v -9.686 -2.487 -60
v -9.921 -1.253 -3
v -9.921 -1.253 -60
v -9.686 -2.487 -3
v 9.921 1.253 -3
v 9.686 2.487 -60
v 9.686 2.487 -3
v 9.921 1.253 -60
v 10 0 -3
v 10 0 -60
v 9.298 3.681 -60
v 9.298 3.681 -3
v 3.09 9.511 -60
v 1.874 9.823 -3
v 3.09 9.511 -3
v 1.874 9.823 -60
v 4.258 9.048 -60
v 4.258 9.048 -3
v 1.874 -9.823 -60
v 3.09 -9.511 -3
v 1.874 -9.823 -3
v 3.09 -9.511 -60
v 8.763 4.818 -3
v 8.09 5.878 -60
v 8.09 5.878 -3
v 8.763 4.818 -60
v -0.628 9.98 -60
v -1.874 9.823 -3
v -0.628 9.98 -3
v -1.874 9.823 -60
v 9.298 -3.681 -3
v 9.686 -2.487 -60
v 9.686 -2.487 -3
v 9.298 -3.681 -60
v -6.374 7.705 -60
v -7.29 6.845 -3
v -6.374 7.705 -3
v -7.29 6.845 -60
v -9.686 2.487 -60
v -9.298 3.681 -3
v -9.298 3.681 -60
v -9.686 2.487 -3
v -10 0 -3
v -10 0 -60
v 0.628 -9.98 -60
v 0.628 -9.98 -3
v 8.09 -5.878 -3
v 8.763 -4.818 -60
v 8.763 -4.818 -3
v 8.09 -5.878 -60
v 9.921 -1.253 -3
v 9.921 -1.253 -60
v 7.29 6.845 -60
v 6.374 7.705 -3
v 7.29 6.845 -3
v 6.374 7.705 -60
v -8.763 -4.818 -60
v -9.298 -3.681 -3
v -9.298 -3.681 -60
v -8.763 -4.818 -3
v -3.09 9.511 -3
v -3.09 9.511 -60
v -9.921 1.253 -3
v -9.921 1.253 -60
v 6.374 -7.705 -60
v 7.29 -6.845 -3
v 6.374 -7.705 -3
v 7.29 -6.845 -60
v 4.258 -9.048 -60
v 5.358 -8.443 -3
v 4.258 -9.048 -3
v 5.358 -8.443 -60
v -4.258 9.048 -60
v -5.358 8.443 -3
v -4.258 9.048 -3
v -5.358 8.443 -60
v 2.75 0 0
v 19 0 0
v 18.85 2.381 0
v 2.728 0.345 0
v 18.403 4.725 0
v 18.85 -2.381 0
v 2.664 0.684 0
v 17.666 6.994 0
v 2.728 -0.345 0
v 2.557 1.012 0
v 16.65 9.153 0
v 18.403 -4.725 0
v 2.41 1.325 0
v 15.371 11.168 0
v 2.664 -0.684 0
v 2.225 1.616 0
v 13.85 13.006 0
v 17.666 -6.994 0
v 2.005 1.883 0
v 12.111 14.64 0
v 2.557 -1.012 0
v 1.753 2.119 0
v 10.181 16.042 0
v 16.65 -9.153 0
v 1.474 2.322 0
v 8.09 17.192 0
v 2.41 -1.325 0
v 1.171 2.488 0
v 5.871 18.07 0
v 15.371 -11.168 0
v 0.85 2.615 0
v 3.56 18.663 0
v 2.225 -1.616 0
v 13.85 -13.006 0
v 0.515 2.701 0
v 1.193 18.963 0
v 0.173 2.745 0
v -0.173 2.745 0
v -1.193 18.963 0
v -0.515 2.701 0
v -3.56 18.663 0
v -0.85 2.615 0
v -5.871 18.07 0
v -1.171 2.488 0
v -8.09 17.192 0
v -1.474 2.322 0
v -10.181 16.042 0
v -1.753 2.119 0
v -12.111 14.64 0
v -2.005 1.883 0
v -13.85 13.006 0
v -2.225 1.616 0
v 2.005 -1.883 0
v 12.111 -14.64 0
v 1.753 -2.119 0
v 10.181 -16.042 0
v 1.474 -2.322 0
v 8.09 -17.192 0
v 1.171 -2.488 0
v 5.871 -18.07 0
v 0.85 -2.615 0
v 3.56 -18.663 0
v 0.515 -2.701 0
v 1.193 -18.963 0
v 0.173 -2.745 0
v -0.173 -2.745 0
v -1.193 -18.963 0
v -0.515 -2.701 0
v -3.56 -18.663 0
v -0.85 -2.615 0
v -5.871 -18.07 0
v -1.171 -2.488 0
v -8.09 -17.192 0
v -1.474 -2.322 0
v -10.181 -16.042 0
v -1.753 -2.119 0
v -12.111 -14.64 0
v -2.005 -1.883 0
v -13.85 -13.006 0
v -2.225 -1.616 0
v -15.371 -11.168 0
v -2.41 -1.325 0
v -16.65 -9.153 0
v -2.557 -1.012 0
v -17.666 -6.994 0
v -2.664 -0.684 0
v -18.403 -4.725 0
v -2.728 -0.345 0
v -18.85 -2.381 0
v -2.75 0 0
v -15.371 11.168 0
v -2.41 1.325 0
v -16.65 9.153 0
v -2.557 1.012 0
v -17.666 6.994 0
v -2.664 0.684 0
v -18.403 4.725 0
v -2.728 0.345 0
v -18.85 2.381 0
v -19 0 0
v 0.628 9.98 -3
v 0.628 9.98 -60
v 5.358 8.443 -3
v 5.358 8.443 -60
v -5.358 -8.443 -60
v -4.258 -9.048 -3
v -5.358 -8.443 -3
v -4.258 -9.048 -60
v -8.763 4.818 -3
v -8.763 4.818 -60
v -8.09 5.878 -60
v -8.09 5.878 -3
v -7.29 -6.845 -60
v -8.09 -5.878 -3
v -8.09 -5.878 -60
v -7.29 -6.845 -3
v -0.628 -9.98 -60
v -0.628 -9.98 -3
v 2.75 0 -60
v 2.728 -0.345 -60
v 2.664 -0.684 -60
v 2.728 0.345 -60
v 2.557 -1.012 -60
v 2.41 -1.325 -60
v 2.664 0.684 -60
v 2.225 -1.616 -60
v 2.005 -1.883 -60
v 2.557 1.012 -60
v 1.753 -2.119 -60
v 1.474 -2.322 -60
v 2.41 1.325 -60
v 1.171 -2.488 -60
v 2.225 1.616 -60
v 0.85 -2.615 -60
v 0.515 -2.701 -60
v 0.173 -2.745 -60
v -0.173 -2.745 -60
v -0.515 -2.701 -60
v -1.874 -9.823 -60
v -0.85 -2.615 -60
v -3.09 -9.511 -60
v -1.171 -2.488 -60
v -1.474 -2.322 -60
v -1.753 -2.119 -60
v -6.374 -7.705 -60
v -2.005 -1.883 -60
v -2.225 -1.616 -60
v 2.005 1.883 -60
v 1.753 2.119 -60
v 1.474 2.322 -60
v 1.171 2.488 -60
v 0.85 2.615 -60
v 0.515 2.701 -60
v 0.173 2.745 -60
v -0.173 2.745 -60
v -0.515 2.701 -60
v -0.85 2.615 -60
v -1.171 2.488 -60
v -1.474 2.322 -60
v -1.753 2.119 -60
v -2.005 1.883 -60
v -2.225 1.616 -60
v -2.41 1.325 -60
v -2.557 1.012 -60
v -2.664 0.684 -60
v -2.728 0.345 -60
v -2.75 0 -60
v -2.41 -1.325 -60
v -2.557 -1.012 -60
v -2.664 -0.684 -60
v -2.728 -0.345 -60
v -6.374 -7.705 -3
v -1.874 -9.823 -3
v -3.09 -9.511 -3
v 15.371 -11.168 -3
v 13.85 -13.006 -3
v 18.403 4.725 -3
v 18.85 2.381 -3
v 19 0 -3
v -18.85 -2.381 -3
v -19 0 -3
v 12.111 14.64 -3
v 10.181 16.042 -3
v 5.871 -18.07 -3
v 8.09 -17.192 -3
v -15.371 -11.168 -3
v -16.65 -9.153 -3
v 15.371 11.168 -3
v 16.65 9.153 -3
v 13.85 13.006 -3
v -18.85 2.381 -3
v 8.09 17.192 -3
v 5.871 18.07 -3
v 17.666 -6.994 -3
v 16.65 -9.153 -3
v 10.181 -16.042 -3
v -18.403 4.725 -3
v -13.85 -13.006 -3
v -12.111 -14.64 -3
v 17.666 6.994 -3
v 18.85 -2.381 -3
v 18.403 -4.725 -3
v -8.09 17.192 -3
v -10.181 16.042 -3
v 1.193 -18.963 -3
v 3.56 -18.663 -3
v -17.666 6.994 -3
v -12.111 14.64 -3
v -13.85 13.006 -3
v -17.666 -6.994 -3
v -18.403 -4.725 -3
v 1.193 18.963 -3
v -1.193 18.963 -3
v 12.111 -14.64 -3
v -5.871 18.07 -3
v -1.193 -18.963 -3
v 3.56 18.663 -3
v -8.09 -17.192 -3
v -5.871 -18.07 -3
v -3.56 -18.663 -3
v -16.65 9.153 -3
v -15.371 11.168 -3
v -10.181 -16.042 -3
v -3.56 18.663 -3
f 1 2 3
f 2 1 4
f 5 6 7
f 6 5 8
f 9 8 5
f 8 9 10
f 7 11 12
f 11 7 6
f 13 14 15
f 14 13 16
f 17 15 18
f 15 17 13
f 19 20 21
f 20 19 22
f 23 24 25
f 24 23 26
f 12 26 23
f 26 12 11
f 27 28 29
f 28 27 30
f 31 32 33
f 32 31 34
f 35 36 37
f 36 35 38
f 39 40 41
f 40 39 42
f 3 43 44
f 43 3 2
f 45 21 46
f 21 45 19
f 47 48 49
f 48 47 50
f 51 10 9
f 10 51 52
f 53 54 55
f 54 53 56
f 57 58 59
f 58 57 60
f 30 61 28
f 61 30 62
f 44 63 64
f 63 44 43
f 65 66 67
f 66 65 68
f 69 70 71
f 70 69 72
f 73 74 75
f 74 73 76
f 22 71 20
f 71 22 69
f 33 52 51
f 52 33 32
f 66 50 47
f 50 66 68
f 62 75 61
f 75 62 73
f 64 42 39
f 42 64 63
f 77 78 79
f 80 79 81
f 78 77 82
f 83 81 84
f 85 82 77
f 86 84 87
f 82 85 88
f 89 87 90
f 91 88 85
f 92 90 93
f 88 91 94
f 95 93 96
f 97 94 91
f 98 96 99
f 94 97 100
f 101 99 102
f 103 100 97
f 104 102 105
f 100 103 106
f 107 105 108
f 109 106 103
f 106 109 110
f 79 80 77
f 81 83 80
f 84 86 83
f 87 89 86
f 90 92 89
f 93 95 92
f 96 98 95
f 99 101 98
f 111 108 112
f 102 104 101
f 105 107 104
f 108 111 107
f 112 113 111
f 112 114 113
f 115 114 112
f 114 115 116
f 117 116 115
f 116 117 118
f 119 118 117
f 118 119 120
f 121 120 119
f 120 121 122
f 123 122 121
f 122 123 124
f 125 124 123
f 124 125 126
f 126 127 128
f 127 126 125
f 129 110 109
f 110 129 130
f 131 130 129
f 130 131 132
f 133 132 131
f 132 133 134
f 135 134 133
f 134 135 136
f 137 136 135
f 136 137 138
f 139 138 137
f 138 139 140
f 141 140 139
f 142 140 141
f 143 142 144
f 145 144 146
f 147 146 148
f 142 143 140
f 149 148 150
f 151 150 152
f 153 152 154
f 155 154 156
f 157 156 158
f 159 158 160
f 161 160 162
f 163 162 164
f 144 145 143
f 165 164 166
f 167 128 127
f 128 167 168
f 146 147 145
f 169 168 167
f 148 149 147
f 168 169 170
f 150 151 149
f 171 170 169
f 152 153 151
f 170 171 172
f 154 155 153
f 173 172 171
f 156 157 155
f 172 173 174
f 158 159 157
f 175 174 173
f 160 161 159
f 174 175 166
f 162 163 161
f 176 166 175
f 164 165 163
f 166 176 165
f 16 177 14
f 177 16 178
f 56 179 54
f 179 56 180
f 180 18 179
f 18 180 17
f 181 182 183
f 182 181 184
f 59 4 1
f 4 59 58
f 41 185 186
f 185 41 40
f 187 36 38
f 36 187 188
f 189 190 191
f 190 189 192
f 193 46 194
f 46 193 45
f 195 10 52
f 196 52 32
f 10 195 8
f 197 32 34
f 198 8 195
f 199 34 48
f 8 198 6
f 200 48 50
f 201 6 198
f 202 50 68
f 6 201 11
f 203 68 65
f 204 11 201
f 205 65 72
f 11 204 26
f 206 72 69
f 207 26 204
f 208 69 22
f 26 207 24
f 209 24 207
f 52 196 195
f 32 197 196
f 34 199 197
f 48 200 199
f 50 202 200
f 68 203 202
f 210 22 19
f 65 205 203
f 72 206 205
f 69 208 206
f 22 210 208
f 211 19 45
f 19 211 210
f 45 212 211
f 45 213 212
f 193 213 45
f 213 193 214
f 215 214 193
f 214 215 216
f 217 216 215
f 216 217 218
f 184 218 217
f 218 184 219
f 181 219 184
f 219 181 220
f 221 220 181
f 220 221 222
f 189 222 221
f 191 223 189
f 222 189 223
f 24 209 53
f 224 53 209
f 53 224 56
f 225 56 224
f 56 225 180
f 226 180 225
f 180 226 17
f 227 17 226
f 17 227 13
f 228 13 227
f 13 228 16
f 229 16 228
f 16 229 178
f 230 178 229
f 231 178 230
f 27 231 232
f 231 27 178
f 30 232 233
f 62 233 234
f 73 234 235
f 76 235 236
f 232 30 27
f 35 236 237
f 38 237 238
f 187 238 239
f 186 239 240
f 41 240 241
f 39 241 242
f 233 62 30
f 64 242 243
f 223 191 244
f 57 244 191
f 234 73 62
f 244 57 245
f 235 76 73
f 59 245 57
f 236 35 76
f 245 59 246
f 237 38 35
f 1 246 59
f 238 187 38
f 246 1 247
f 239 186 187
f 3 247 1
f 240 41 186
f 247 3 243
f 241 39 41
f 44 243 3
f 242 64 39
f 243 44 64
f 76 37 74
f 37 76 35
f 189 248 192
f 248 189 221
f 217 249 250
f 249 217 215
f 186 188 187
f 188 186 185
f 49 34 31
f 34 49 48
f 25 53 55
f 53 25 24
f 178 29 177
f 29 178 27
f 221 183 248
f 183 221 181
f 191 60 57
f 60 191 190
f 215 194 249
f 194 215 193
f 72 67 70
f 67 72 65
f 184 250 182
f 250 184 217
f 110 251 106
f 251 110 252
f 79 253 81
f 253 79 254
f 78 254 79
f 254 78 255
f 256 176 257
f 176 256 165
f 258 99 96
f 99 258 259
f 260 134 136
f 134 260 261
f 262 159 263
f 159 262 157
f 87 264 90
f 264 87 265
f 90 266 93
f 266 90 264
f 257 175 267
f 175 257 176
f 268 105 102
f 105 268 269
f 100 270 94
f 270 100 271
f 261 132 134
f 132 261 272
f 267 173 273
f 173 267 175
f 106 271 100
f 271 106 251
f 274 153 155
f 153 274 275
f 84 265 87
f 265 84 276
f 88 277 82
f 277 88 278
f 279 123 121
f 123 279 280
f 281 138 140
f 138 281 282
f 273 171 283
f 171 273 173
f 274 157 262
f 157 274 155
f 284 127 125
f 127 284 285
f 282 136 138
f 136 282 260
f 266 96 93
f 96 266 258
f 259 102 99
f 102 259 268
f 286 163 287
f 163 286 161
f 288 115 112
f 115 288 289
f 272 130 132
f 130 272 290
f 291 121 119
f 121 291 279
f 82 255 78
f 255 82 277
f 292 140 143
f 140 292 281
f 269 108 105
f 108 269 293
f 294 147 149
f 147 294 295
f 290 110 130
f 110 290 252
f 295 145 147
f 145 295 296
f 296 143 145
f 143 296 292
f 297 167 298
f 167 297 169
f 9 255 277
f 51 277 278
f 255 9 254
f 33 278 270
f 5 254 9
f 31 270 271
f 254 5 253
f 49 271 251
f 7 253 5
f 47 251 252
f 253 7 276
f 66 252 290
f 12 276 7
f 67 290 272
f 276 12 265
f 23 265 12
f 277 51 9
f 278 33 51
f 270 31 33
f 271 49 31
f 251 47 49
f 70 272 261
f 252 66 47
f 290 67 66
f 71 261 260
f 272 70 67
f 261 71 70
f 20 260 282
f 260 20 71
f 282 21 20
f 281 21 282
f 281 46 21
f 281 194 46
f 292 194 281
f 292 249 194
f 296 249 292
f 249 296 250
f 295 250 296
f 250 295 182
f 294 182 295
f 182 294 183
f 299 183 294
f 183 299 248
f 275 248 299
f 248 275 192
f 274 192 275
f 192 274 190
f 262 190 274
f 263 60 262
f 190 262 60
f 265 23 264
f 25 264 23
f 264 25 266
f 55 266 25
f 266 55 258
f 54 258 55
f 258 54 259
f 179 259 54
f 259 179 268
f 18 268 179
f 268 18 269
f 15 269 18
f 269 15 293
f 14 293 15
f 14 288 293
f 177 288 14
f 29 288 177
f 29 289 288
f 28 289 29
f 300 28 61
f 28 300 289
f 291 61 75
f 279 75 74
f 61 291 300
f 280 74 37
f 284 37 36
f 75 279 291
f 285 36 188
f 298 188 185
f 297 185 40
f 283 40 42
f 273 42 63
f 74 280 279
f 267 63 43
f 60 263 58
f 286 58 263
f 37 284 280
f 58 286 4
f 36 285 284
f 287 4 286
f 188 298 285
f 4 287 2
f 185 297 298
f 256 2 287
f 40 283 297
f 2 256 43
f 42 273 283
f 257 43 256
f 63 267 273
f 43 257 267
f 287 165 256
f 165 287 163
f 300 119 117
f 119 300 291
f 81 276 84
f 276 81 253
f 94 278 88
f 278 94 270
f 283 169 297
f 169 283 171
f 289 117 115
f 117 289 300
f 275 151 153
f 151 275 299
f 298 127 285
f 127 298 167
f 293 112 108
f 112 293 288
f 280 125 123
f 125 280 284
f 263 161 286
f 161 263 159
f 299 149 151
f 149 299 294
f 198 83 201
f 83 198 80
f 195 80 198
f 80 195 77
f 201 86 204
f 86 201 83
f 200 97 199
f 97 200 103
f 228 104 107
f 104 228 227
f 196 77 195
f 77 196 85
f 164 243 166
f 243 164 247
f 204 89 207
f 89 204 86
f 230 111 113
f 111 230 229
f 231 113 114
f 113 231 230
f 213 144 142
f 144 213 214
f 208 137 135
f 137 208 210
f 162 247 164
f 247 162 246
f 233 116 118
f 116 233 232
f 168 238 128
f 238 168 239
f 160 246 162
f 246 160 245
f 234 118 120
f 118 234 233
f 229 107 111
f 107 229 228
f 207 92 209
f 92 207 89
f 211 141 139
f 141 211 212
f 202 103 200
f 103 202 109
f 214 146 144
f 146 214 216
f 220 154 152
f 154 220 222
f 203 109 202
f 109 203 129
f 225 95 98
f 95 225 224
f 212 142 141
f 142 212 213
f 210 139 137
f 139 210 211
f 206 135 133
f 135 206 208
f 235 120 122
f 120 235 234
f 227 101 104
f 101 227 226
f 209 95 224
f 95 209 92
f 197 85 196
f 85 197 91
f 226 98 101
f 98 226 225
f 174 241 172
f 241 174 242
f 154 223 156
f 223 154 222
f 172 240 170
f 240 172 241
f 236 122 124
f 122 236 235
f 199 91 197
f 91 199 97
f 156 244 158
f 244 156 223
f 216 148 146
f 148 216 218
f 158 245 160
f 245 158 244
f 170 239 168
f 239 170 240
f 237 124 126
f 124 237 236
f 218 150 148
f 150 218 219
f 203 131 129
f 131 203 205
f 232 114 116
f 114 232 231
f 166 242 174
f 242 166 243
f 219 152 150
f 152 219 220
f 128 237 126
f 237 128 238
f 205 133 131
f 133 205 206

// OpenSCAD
$fn = 50;


difference() {
	union() {
		translate(v = [0, 0, -60.0000000000]) {
			cylinder(h = 60, r = 10.0000000000);
		}
		translate(v = [0, 0, -3.0000000000]) {
			cylinder(h = 3, r = 19.0000000000);
		}
	}
	union() {
		#translate(v = [0, 0, -60]) {
			cylinder(h = 60, r = 2.7500000000);
		}
	}
}
